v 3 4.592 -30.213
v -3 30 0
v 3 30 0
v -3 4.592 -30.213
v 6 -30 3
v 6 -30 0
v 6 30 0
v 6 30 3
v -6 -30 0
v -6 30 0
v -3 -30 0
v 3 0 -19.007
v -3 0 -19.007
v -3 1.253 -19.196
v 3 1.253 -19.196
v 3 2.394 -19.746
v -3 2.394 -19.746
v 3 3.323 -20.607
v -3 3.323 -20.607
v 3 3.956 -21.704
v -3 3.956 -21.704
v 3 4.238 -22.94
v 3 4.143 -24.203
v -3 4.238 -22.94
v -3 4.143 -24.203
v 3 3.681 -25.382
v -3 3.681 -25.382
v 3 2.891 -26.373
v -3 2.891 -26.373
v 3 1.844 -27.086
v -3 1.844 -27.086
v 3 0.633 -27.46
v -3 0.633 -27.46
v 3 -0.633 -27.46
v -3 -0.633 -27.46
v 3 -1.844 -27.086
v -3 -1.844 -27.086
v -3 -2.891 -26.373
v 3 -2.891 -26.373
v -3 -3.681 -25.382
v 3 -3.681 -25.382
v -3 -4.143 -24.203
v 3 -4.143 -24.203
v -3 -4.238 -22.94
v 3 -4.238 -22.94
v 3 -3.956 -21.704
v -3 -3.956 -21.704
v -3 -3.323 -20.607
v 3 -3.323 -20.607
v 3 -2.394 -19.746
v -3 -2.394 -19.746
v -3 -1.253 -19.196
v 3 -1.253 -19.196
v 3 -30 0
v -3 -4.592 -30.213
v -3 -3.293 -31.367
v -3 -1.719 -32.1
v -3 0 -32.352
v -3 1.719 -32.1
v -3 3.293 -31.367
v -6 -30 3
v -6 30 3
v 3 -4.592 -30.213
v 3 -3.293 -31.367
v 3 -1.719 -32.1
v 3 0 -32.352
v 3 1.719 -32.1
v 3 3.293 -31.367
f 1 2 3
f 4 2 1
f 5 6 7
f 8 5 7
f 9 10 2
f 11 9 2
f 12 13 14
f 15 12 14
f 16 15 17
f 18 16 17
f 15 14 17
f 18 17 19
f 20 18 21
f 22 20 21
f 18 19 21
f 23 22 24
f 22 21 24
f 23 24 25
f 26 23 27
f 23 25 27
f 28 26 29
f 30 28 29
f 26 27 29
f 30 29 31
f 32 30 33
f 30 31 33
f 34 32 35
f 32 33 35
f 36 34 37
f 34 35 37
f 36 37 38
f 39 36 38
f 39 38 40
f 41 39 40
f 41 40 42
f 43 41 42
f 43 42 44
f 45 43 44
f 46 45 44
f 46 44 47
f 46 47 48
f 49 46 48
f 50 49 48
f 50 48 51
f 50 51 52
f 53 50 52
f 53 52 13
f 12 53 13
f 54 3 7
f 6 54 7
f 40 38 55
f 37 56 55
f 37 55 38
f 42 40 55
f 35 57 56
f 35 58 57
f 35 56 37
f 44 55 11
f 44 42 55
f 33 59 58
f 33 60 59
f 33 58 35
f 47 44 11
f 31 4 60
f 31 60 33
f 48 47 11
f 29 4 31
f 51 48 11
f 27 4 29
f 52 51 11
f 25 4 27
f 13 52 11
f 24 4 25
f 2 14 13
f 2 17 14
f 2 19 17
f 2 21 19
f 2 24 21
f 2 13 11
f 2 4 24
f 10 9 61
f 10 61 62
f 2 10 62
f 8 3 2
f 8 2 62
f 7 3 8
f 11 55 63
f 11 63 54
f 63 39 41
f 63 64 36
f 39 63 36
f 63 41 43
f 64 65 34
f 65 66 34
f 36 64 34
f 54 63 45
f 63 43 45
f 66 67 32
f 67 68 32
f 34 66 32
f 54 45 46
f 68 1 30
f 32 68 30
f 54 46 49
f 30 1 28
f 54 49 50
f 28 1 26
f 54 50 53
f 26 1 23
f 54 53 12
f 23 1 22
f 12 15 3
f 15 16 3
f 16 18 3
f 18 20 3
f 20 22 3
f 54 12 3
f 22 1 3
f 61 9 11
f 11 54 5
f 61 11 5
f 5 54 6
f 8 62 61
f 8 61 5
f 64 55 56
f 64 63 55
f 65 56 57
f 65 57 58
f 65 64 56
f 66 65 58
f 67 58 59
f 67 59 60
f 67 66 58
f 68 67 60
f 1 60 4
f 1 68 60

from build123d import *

# Parameters (mm, degrees)
SKETCH_1_W           = 12
SKETCH_1_H           = 60
EXTRUDE_1_DEPTH      = 3
EXTRUDE_2_DEPTH      = 3
EXTRUDE_2_DEPTH_BACK = 3
FILLET_1_R           = 6
SKETCH_4_R           = 4.25
CUT_EXTRUDE_1_DEPTH  = 46.029309177


with BuildPart() as part:
    # 草图1 → 凸台-拉伸1 (new body)
    with BuildSketch(Plane.XY):
        Rectangle(SKETCH_1_W, SKETCH_1_H)
    extrude(amount=EXTRUDE_1_DEPTH)

    # 草图3 → 凸台-拉伸2 (add, two sides: drawn at the far end of the back side and taken through both)
    with BuildSketch(Plane(origin=(0, 0, 0), x_dir=(0, 0, -1), z_dir=(1, 0, 0)).offset(-EXTRUDE_2_DEPTH_BACK)):
        Polygon((0, 30), (35.674118933, 0), (0, -30), align=None)
    extrude(amount=EXTRUDE_2_DEPTH + EXTRUDE_2_DEPTH_BACK)

    # 圆角1
    fillet_1_edges = [part.edges().sort_by_distance(p)[0] for p in [
        (0, 0, -35.674118933),
    ]]
    fillet(fillet_1_edges, radius=FILLET_1_R)

    # 草图4 → 切除-拉伸1 (cut, through all)
    with BuildSketch(Plane.ZY.offset(3)):
        with Locations((-23.257154685, 0)):
            Circle(SKETCH_4_R)
    extrude(amount=-CUT_EXTRUDE_1_DEPTH, mode=Mode.SUBTRACT)


solid = part.part
